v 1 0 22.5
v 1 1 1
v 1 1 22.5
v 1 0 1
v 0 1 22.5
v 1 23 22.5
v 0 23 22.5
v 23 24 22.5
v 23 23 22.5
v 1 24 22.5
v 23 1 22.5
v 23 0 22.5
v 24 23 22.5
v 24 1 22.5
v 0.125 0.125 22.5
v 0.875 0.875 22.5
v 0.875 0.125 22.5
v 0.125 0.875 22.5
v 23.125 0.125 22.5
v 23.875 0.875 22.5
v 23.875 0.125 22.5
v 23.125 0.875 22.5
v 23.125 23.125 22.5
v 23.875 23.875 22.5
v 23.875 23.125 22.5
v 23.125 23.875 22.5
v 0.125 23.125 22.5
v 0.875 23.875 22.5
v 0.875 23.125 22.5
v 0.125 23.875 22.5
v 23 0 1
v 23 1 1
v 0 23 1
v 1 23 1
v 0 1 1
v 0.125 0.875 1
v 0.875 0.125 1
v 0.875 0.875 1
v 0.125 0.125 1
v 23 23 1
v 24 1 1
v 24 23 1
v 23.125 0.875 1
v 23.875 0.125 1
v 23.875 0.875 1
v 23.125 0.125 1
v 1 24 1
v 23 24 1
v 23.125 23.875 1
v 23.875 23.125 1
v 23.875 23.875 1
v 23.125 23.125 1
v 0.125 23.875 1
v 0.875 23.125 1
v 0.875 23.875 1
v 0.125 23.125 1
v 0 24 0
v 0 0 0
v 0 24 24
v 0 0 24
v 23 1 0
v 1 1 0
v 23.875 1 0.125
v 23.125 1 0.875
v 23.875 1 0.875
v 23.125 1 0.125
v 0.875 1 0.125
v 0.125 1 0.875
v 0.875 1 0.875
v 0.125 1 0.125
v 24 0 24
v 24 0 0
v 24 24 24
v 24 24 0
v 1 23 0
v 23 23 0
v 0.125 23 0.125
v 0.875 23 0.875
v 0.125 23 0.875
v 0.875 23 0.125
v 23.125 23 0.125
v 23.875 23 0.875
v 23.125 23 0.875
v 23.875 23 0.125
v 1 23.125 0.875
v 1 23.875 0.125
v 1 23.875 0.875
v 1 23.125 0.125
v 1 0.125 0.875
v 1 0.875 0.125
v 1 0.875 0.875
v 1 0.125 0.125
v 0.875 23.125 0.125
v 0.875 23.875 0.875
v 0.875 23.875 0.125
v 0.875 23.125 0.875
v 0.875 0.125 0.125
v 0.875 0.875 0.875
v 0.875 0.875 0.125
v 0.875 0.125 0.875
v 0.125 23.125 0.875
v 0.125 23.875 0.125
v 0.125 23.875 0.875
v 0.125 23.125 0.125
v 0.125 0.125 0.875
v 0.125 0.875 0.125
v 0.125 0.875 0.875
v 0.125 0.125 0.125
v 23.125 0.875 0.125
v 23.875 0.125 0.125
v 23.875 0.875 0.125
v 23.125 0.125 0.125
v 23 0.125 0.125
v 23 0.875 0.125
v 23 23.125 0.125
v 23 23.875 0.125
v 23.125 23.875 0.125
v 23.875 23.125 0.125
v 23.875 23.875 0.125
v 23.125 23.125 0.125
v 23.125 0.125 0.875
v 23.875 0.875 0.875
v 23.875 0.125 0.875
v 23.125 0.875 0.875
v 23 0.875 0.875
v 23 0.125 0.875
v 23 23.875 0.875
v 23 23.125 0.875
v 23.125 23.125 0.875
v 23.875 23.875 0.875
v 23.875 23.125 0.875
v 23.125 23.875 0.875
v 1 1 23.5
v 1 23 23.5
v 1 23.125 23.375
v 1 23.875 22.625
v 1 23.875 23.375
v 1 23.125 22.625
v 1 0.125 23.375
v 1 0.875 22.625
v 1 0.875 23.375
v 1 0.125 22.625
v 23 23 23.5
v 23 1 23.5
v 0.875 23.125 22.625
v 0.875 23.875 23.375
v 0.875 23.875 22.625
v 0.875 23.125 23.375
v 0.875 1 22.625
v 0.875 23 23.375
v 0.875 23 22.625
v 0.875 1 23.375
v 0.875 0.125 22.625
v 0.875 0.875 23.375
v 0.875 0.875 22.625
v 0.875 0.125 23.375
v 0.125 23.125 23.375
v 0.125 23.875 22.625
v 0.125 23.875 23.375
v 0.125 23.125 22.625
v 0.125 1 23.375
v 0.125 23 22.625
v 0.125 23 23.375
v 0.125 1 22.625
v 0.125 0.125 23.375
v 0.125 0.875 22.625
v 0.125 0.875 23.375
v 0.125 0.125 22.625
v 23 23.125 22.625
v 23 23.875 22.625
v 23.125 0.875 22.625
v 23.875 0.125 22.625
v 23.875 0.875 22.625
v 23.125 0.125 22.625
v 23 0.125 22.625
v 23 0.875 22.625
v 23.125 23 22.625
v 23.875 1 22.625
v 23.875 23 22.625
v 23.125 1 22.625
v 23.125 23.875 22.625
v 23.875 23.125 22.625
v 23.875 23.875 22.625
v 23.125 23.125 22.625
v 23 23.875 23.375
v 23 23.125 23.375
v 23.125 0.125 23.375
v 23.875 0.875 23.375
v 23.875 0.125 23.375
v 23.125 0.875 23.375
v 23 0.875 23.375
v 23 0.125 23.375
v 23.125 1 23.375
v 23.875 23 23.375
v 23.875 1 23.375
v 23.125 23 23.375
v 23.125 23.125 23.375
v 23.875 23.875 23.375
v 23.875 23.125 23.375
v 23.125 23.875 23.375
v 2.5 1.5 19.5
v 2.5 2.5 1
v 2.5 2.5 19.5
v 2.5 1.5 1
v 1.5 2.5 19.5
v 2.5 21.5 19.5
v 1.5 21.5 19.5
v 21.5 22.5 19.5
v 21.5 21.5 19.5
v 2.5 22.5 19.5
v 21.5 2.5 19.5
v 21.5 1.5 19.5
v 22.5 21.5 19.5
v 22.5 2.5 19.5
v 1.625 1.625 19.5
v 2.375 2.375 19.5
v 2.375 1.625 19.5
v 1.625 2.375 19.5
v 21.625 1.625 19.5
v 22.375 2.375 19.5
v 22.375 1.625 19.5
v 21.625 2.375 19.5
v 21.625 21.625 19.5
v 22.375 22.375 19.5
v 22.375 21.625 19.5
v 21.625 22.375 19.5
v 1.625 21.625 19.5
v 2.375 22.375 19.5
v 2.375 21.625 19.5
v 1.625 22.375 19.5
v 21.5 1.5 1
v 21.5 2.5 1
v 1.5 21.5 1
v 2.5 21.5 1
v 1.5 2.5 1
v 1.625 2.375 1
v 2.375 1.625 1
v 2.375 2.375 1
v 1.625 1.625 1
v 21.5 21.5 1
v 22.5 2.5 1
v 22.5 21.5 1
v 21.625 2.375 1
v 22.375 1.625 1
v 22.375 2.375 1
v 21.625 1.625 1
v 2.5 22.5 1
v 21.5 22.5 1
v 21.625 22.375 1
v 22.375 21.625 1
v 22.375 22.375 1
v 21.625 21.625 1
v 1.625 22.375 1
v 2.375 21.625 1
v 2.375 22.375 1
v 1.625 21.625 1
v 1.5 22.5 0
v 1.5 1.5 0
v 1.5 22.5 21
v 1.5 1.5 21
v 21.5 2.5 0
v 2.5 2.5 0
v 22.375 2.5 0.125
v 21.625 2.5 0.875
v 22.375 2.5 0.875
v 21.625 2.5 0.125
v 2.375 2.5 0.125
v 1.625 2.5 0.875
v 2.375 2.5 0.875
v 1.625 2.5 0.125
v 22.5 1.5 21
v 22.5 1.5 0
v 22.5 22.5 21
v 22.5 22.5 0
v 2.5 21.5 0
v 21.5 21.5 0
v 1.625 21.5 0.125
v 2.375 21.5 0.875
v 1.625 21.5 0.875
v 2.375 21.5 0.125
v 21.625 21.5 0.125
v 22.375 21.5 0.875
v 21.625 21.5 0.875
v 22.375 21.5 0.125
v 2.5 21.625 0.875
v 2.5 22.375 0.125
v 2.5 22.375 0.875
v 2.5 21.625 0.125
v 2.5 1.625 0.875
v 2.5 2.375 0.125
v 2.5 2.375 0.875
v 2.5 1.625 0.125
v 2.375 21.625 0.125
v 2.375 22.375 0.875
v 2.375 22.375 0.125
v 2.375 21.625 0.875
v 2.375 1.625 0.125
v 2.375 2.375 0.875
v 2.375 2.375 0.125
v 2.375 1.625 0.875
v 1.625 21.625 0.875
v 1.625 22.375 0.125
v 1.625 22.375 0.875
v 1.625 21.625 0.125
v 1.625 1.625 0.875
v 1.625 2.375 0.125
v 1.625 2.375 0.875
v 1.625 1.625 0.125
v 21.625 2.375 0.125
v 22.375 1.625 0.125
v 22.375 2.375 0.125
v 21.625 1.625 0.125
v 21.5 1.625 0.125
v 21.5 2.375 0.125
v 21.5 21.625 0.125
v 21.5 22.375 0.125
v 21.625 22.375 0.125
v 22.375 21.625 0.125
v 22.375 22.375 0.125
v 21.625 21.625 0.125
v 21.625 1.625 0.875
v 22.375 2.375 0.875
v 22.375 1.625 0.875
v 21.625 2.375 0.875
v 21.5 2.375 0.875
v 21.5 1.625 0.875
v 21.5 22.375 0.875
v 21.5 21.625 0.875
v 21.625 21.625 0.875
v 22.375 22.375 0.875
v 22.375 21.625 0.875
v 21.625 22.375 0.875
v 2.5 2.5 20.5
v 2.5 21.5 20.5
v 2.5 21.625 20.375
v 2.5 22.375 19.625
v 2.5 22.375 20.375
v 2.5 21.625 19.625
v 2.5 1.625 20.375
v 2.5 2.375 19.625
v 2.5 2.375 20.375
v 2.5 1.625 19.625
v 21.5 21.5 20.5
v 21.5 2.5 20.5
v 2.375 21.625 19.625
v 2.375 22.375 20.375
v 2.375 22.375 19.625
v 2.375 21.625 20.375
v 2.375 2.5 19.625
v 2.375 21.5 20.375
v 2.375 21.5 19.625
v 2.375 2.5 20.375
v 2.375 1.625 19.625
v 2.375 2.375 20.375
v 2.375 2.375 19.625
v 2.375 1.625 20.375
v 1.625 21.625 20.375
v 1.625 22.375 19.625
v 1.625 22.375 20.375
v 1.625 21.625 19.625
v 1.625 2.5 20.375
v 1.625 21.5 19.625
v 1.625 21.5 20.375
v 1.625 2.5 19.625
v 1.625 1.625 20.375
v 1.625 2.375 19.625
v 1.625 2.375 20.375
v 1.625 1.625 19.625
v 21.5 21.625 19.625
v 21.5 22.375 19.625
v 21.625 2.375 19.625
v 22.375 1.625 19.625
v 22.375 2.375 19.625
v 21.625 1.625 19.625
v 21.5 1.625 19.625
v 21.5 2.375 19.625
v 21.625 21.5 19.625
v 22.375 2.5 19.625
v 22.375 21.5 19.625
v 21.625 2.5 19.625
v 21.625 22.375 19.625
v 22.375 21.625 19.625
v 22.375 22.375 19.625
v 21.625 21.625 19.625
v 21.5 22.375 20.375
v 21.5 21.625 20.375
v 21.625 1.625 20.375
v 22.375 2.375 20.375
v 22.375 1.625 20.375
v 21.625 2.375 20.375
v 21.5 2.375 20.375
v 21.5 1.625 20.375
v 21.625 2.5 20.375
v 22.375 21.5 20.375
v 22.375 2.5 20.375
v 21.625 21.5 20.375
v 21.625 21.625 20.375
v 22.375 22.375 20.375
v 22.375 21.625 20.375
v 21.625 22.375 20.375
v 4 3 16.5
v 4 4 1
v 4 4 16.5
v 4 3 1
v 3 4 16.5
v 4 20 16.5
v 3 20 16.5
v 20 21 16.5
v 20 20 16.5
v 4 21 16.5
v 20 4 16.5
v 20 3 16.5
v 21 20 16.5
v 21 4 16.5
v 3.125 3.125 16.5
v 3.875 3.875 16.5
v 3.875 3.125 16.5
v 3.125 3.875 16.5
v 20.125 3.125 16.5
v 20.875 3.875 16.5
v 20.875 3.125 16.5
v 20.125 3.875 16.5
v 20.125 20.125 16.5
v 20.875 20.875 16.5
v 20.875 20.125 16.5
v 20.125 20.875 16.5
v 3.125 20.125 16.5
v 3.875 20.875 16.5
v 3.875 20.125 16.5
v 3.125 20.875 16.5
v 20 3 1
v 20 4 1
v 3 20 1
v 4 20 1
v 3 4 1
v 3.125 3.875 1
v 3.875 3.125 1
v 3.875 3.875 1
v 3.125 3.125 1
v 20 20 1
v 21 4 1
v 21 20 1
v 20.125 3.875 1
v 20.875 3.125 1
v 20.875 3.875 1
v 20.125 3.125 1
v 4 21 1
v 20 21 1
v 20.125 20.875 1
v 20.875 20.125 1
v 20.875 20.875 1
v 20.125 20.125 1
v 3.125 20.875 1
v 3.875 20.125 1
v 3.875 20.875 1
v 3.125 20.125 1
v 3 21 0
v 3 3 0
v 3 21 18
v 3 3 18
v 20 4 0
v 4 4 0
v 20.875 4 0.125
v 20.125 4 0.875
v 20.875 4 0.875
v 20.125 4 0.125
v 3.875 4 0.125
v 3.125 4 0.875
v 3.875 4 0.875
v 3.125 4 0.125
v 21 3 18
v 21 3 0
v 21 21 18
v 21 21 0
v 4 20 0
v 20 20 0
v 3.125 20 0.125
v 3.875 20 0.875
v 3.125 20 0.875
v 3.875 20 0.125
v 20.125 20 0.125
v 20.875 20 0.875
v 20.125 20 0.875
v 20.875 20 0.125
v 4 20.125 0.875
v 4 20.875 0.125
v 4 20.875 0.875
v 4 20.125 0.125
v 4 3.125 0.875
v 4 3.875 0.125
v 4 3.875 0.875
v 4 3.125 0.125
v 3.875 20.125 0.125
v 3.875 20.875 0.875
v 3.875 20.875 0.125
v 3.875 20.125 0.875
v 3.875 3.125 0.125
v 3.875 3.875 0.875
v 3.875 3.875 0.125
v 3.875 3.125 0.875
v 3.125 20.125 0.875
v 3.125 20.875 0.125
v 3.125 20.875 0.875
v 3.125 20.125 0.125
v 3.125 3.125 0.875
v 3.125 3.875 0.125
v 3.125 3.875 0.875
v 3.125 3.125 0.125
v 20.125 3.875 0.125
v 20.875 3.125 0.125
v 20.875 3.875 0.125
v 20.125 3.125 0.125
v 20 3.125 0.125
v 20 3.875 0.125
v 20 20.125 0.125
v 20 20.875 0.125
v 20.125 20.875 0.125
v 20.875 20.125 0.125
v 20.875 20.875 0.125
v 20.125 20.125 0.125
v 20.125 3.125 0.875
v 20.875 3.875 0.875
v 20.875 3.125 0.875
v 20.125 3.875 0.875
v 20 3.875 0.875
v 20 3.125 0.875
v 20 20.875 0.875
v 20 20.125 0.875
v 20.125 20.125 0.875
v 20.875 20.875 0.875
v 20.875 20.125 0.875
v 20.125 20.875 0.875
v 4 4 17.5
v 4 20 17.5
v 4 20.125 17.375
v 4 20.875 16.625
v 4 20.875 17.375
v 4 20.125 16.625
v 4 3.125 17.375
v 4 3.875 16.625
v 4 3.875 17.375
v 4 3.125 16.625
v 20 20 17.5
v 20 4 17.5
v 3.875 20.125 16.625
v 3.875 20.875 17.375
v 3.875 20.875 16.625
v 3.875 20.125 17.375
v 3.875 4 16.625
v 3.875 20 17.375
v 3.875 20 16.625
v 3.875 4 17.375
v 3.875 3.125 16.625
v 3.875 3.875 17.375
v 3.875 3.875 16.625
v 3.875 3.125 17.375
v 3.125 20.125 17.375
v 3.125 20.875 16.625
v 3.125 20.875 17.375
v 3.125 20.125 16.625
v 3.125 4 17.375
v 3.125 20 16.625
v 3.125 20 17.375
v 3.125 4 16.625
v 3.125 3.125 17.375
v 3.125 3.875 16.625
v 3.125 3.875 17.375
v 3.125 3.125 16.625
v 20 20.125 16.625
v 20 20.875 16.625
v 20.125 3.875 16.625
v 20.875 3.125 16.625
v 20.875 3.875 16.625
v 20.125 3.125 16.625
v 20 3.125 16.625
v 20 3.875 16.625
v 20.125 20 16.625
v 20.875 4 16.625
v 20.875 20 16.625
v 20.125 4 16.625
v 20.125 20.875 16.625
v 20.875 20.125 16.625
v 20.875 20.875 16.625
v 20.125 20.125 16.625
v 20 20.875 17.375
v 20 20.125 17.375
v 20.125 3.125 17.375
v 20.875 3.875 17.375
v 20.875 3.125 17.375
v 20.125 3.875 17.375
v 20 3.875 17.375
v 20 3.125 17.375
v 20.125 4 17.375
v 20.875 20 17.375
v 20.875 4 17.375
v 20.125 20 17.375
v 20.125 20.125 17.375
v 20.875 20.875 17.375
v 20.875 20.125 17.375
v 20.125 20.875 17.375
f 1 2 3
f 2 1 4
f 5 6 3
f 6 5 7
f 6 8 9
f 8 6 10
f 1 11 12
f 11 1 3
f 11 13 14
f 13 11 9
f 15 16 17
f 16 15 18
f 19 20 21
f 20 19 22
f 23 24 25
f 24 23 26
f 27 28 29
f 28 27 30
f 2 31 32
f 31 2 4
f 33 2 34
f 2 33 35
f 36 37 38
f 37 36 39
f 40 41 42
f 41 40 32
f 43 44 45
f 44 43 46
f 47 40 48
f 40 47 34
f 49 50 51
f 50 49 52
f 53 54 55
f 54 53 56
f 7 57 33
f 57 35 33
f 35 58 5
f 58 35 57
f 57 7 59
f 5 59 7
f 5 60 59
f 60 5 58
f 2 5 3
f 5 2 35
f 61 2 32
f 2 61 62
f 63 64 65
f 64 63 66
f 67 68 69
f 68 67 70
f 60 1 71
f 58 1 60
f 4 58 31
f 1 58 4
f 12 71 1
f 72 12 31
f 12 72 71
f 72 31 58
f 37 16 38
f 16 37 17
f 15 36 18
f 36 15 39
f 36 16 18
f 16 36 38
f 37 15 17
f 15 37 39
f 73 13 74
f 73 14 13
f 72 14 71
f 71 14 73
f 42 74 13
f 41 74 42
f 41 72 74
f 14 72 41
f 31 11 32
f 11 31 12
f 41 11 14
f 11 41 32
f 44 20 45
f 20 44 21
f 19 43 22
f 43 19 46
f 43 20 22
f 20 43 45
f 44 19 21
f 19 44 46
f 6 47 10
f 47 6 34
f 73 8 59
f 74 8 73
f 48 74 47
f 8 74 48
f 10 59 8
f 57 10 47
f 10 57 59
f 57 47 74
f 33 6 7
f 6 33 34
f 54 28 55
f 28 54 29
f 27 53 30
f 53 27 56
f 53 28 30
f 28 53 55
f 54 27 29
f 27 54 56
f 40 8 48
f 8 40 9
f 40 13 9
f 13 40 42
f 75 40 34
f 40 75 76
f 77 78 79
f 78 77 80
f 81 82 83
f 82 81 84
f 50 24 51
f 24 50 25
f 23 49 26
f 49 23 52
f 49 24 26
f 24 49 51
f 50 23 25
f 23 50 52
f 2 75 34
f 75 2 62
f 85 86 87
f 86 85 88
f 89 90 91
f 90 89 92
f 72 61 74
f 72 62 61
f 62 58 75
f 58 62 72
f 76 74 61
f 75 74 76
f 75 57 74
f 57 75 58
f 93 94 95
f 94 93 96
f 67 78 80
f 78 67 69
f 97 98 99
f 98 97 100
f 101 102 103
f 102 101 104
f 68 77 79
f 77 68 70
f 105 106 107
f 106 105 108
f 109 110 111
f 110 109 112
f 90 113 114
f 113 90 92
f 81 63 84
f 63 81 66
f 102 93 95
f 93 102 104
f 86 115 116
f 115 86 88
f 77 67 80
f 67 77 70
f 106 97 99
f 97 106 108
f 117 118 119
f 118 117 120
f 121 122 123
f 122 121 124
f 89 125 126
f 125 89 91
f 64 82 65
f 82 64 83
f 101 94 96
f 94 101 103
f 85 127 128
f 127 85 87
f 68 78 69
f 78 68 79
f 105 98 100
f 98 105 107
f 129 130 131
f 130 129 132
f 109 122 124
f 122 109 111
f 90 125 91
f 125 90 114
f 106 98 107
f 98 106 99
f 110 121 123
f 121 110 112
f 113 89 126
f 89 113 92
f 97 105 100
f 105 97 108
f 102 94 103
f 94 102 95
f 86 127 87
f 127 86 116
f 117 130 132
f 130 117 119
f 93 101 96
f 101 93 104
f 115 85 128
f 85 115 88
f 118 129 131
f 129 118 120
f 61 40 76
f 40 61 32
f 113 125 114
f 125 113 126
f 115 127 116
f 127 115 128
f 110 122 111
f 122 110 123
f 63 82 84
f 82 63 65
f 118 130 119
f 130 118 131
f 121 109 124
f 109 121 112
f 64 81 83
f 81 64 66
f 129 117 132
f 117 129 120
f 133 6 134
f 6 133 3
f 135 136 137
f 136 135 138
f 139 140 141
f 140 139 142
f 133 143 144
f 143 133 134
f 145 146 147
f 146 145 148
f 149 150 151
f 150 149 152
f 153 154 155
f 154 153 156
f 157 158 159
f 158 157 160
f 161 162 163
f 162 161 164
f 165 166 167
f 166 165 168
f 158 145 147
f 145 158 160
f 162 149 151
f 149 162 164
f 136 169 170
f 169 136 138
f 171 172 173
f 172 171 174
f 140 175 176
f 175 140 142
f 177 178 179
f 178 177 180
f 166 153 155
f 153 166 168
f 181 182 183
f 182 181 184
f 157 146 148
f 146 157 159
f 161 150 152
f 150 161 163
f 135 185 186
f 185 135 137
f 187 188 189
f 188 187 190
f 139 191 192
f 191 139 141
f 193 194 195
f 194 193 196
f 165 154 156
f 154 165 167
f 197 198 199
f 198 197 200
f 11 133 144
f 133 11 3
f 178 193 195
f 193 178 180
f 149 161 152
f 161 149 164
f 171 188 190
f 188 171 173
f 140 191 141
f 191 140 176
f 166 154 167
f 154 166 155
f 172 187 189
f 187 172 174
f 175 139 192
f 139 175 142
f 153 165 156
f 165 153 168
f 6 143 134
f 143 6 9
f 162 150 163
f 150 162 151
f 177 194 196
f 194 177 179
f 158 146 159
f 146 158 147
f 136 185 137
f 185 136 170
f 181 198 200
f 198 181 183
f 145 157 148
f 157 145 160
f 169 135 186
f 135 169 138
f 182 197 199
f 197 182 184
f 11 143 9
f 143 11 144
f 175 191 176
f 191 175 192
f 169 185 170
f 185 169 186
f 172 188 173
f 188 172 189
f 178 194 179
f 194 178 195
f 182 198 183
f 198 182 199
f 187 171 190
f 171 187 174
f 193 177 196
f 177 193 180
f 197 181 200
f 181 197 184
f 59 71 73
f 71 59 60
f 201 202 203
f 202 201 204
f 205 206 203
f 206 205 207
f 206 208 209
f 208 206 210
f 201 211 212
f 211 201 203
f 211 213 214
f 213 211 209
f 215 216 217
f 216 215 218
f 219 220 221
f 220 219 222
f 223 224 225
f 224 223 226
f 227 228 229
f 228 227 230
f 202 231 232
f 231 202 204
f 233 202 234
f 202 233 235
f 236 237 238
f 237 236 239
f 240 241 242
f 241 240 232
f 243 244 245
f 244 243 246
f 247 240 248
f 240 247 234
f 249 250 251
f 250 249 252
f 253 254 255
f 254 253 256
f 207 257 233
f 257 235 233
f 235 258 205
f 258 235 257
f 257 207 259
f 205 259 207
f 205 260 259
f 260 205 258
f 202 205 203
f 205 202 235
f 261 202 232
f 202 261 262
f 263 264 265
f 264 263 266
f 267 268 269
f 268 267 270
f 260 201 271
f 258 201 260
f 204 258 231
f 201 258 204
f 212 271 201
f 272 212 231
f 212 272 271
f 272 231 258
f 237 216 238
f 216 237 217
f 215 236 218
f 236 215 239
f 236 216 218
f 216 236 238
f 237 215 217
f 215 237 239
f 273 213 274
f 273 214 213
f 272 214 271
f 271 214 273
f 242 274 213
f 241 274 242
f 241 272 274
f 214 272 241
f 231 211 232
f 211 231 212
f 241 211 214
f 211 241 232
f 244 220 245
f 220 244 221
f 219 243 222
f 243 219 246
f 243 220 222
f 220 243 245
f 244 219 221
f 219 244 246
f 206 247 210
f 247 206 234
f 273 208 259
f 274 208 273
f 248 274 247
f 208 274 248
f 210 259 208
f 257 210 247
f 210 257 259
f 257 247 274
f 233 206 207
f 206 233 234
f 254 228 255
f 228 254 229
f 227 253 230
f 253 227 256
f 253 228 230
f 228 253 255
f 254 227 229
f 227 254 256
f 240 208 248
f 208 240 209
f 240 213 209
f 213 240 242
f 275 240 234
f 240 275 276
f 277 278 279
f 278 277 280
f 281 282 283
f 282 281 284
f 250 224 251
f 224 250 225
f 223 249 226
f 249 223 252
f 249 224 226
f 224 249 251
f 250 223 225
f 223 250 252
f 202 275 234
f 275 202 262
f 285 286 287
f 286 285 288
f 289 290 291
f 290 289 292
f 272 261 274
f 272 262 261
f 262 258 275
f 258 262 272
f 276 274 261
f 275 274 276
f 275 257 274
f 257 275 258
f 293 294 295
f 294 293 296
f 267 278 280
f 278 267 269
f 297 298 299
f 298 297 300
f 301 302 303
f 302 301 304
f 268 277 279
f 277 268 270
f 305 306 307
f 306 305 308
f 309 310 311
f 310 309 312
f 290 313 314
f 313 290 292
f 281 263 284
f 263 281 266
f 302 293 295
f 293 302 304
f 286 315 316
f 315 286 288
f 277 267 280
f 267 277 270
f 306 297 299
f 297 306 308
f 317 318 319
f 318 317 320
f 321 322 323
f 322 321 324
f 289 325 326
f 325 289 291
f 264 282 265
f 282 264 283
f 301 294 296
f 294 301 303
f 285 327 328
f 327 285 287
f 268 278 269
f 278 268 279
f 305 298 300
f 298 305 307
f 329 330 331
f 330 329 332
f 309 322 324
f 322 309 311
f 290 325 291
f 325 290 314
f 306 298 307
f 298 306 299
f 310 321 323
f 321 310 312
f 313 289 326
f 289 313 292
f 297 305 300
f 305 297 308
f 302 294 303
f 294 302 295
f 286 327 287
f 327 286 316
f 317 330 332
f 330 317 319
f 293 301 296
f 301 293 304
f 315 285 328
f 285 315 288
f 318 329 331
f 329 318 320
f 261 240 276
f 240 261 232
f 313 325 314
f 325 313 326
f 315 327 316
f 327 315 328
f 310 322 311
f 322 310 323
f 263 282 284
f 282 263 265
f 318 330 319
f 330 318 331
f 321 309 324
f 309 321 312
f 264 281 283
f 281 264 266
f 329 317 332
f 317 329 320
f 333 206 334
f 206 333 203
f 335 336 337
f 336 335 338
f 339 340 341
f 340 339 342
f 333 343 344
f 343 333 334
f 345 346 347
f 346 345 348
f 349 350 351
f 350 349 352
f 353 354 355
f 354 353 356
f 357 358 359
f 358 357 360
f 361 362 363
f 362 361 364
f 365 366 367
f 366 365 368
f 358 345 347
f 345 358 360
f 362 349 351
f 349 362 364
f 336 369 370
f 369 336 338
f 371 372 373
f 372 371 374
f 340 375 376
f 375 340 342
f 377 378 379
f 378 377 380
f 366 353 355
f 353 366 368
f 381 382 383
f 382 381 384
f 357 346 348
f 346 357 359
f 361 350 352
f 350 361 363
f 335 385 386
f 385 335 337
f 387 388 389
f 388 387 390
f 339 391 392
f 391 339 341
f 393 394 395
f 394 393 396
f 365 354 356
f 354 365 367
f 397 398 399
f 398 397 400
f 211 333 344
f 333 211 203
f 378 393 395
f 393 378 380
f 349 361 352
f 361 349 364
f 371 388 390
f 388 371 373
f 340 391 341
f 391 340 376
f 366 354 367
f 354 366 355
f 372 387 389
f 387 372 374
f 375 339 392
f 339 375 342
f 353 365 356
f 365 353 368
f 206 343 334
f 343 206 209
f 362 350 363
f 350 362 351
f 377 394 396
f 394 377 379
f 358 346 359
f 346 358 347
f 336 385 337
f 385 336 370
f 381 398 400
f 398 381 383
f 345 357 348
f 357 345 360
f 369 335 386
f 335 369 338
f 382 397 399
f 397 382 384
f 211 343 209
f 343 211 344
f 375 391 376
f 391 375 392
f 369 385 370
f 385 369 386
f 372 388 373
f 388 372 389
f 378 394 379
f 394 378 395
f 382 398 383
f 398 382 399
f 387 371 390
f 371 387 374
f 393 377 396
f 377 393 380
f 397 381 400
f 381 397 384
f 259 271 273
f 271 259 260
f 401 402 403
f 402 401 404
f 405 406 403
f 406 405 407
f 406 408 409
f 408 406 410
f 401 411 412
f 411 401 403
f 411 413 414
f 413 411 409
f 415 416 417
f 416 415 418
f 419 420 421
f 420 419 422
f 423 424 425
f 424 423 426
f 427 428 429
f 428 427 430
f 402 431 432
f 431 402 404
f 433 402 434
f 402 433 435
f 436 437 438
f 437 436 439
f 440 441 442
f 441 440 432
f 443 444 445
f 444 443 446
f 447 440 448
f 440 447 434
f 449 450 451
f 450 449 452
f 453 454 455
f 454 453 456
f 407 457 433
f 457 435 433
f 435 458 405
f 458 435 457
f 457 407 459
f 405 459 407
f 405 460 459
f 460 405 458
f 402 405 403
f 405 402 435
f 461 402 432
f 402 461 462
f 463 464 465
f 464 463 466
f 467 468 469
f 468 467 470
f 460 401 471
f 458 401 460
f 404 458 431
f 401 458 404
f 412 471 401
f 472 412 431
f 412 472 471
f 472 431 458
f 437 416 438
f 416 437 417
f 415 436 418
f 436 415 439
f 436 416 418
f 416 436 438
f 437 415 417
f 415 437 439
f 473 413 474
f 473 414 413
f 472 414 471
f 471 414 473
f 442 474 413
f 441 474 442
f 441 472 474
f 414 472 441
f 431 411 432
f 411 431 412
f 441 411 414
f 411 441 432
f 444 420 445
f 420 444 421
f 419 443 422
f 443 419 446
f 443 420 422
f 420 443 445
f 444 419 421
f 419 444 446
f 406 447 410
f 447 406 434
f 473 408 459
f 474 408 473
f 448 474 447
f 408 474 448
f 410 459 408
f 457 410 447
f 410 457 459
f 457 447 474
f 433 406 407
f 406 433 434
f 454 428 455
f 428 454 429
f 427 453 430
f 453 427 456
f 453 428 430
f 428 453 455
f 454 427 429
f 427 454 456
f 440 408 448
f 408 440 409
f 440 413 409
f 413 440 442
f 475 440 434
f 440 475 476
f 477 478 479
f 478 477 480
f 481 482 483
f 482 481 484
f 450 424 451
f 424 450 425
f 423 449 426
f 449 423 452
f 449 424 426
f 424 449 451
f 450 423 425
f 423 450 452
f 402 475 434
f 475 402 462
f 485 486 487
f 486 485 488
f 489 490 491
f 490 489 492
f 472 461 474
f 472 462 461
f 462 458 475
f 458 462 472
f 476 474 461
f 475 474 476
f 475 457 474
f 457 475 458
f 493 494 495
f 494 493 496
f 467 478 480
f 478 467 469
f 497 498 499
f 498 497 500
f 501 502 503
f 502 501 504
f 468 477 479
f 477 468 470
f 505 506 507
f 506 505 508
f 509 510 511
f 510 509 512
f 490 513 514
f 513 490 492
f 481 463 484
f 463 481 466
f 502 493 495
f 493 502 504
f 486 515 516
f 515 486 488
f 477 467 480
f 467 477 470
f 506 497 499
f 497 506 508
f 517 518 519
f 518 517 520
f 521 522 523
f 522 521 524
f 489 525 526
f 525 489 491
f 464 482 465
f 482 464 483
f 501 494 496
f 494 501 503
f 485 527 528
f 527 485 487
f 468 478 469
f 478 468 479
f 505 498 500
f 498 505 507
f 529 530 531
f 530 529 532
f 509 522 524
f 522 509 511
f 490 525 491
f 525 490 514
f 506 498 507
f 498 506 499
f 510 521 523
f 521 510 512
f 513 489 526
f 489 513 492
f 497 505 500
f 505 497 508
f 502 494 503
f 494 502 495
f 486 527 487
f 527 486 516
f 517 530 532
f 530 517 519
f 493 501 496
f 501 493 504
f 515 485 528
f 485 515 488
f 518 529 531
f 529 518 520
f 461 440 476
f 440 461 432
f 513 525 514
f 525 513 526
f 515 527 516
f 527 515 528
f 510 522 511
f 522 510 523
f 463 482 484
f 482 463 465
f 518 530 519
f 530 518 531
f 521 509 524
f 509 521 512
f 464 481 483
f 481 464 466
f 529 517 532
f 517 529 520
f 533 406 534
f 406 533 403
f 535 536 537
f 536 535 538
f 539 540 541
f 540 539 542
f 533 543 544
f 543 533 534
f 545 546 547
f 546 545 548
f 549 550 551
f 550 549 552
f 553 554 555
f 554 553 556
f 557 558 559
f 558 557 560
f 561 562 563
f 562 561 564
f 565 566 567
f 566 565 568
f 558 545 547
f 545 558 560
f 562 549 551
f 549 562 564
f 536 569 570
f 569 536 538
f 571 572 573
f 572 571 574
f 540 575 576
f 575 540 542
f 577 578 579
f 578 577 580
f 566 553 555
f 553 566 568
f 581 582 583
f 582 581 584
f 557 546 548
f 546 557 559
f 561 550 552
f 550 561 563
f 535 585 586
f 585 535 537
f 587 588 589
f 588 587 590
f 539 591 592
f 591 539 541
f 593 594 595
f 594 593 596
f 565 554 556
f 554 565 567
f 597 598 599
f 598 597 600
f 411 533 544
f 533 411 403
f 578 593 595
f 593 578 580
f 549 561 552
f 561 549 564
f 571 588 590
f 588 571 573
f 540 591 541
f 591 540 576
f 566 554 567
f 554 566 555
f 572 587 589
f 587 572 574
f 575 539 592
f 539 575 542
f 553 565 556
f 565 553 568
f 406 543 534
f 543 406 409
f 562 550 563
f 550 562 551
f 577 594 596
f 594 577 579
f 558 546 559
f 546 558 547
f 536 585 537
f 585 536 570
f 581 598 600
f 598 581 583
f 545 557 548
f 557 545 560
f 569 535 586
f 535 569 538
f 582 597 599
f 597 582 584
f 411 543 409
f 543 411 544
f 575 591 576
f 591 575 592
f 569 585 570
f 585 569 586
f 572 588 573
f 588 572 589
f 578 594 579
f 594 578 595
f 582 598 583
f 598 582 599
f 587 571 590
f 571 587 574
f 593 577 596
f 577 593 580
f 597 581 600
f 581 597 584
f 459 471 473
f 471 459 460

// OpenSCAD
// file: parts.scad
module rectangularTube(height, width, length, thickness) {
    difference()
    {
        cube([height, width, length]);
        // Ensure the inside sticks out a bit more to avoid clipping
        translate([thickness, thickness, -1]) {
            cube([height - 2*thickness, width - 2*thickness, length+2]);
        };
    }
};

module angleIron(height, width, length, thickness) {
    union()
    {
        cube([height, thickness, length]);
        rotate([0, -90, 0]) {
            translate([0, 0, -1 * thickness]) {
                cube([length, width, thickness]);
            }
        }
    }
}

module circularTube(outer, thickness, length) {
    outerRadius = outer / 2;
    innerRadius = outerRadius - thickness;
    difference() {
        cylinder(length, outerRadius, outerRadius, $fn=32);
        // Ensure the inside sticks out a bit more to avoid clipping
        translate([0, 0, -1]) {
            cylinder(length + 2, innerRadius, innerRadius, $fn=32);
        }
    }

}

module circularBar(diameter, length) {
        cylinder(h=length, r1=diameter/2, r2=diameter/2, $fn=32);
}

module flatBar(thickness, width, length) {
    cube([width, length, thickness]);
}


rectangularTube(4, 4, 12, .25);

translate([ 10, 0, 0]) {
    angleIron( 4, 4, 12, .25);
}

translate([ 22, 2, 0]) {
    circularTube(4, .25, 12);
}

translate([ 30, 0, 0]) {
    rotate([90, 0, 0]) {
        flatBar(.25, 4, 12);
    }
}


translate([ 40, 2, 0]) {
    circularBar(4, 12);
}
// main file
use <parts.scad>;

wallThickness = .125;
tubeDim = 1;
seatThickness = .5;

module tube(length) {
    color("grey")
    rectangularTube(tubeDim, tubeDim, length, wallThickness);
}

module cubeStool(length) {
    riserHeight = length - seatThickness - (2*tubeDim);

    // Risers
    translate([0, 0, tubeDim]) {
        tube(riserHeight);
    }
    translate([length - tubeDim, 0, tubeDim]) {
        tube(riserHeight);
    }

    translate([0, length - tubeDim, tubeDim]) {
        tube(riserHeight);
    }

    translate([length - tubeDim, length - tubeDim, tubeDim]) {
        tube(riserHeight);
    }

    // Bottom

    translate([0, 0, tubeDim]){
        rotate([-90, 0, 0]) {
            tube(length);
        }
    }
    translate([0, 0, tubeDim]){
        rotate([0, 90, 0]) {
            tube(length);
        }
    }

    translate([0, length - tubeDim, tubeDim]){
        rotate([0, 90, 0]) {
            tube(length);
        }
    }

    translate([length - tubeDim, 0, tubeDim]){
        rotate([-90, 0, 0]) {
            tube(length);
        }
    }

    // top
    topHeight = length - seatThickness;
    translate([0, 0, topHeight]) {
        translate([0, 0, 0]){
            rotate([-90, 0, 0]) {
                tube(length);
            }
        }
        translate([0, 0, 0]){
            rotate([0, 90, 0]) {
                tube(length);
            }
        }

        translate([0, length - tubeDim, 0]){
            rotate([0, 90, 0]) {
                tube(length);
            }
        }

        translate([length - tubeDim, 0, 0]){
            rotate([-90, 0, 0]) {
                tube(length);
            }
        }
    }

    // seat
    translate([ 0, 0, length - seatThickness]) {
        color("brown")
        cube([length, length, seatThickness]);
    }

}


cubeStool(24);

translate([1.5, 1.5, 0]) {
    cubeStool(21);
}

translate([3, 3, 0]) {
    cubeStool(18);
}
